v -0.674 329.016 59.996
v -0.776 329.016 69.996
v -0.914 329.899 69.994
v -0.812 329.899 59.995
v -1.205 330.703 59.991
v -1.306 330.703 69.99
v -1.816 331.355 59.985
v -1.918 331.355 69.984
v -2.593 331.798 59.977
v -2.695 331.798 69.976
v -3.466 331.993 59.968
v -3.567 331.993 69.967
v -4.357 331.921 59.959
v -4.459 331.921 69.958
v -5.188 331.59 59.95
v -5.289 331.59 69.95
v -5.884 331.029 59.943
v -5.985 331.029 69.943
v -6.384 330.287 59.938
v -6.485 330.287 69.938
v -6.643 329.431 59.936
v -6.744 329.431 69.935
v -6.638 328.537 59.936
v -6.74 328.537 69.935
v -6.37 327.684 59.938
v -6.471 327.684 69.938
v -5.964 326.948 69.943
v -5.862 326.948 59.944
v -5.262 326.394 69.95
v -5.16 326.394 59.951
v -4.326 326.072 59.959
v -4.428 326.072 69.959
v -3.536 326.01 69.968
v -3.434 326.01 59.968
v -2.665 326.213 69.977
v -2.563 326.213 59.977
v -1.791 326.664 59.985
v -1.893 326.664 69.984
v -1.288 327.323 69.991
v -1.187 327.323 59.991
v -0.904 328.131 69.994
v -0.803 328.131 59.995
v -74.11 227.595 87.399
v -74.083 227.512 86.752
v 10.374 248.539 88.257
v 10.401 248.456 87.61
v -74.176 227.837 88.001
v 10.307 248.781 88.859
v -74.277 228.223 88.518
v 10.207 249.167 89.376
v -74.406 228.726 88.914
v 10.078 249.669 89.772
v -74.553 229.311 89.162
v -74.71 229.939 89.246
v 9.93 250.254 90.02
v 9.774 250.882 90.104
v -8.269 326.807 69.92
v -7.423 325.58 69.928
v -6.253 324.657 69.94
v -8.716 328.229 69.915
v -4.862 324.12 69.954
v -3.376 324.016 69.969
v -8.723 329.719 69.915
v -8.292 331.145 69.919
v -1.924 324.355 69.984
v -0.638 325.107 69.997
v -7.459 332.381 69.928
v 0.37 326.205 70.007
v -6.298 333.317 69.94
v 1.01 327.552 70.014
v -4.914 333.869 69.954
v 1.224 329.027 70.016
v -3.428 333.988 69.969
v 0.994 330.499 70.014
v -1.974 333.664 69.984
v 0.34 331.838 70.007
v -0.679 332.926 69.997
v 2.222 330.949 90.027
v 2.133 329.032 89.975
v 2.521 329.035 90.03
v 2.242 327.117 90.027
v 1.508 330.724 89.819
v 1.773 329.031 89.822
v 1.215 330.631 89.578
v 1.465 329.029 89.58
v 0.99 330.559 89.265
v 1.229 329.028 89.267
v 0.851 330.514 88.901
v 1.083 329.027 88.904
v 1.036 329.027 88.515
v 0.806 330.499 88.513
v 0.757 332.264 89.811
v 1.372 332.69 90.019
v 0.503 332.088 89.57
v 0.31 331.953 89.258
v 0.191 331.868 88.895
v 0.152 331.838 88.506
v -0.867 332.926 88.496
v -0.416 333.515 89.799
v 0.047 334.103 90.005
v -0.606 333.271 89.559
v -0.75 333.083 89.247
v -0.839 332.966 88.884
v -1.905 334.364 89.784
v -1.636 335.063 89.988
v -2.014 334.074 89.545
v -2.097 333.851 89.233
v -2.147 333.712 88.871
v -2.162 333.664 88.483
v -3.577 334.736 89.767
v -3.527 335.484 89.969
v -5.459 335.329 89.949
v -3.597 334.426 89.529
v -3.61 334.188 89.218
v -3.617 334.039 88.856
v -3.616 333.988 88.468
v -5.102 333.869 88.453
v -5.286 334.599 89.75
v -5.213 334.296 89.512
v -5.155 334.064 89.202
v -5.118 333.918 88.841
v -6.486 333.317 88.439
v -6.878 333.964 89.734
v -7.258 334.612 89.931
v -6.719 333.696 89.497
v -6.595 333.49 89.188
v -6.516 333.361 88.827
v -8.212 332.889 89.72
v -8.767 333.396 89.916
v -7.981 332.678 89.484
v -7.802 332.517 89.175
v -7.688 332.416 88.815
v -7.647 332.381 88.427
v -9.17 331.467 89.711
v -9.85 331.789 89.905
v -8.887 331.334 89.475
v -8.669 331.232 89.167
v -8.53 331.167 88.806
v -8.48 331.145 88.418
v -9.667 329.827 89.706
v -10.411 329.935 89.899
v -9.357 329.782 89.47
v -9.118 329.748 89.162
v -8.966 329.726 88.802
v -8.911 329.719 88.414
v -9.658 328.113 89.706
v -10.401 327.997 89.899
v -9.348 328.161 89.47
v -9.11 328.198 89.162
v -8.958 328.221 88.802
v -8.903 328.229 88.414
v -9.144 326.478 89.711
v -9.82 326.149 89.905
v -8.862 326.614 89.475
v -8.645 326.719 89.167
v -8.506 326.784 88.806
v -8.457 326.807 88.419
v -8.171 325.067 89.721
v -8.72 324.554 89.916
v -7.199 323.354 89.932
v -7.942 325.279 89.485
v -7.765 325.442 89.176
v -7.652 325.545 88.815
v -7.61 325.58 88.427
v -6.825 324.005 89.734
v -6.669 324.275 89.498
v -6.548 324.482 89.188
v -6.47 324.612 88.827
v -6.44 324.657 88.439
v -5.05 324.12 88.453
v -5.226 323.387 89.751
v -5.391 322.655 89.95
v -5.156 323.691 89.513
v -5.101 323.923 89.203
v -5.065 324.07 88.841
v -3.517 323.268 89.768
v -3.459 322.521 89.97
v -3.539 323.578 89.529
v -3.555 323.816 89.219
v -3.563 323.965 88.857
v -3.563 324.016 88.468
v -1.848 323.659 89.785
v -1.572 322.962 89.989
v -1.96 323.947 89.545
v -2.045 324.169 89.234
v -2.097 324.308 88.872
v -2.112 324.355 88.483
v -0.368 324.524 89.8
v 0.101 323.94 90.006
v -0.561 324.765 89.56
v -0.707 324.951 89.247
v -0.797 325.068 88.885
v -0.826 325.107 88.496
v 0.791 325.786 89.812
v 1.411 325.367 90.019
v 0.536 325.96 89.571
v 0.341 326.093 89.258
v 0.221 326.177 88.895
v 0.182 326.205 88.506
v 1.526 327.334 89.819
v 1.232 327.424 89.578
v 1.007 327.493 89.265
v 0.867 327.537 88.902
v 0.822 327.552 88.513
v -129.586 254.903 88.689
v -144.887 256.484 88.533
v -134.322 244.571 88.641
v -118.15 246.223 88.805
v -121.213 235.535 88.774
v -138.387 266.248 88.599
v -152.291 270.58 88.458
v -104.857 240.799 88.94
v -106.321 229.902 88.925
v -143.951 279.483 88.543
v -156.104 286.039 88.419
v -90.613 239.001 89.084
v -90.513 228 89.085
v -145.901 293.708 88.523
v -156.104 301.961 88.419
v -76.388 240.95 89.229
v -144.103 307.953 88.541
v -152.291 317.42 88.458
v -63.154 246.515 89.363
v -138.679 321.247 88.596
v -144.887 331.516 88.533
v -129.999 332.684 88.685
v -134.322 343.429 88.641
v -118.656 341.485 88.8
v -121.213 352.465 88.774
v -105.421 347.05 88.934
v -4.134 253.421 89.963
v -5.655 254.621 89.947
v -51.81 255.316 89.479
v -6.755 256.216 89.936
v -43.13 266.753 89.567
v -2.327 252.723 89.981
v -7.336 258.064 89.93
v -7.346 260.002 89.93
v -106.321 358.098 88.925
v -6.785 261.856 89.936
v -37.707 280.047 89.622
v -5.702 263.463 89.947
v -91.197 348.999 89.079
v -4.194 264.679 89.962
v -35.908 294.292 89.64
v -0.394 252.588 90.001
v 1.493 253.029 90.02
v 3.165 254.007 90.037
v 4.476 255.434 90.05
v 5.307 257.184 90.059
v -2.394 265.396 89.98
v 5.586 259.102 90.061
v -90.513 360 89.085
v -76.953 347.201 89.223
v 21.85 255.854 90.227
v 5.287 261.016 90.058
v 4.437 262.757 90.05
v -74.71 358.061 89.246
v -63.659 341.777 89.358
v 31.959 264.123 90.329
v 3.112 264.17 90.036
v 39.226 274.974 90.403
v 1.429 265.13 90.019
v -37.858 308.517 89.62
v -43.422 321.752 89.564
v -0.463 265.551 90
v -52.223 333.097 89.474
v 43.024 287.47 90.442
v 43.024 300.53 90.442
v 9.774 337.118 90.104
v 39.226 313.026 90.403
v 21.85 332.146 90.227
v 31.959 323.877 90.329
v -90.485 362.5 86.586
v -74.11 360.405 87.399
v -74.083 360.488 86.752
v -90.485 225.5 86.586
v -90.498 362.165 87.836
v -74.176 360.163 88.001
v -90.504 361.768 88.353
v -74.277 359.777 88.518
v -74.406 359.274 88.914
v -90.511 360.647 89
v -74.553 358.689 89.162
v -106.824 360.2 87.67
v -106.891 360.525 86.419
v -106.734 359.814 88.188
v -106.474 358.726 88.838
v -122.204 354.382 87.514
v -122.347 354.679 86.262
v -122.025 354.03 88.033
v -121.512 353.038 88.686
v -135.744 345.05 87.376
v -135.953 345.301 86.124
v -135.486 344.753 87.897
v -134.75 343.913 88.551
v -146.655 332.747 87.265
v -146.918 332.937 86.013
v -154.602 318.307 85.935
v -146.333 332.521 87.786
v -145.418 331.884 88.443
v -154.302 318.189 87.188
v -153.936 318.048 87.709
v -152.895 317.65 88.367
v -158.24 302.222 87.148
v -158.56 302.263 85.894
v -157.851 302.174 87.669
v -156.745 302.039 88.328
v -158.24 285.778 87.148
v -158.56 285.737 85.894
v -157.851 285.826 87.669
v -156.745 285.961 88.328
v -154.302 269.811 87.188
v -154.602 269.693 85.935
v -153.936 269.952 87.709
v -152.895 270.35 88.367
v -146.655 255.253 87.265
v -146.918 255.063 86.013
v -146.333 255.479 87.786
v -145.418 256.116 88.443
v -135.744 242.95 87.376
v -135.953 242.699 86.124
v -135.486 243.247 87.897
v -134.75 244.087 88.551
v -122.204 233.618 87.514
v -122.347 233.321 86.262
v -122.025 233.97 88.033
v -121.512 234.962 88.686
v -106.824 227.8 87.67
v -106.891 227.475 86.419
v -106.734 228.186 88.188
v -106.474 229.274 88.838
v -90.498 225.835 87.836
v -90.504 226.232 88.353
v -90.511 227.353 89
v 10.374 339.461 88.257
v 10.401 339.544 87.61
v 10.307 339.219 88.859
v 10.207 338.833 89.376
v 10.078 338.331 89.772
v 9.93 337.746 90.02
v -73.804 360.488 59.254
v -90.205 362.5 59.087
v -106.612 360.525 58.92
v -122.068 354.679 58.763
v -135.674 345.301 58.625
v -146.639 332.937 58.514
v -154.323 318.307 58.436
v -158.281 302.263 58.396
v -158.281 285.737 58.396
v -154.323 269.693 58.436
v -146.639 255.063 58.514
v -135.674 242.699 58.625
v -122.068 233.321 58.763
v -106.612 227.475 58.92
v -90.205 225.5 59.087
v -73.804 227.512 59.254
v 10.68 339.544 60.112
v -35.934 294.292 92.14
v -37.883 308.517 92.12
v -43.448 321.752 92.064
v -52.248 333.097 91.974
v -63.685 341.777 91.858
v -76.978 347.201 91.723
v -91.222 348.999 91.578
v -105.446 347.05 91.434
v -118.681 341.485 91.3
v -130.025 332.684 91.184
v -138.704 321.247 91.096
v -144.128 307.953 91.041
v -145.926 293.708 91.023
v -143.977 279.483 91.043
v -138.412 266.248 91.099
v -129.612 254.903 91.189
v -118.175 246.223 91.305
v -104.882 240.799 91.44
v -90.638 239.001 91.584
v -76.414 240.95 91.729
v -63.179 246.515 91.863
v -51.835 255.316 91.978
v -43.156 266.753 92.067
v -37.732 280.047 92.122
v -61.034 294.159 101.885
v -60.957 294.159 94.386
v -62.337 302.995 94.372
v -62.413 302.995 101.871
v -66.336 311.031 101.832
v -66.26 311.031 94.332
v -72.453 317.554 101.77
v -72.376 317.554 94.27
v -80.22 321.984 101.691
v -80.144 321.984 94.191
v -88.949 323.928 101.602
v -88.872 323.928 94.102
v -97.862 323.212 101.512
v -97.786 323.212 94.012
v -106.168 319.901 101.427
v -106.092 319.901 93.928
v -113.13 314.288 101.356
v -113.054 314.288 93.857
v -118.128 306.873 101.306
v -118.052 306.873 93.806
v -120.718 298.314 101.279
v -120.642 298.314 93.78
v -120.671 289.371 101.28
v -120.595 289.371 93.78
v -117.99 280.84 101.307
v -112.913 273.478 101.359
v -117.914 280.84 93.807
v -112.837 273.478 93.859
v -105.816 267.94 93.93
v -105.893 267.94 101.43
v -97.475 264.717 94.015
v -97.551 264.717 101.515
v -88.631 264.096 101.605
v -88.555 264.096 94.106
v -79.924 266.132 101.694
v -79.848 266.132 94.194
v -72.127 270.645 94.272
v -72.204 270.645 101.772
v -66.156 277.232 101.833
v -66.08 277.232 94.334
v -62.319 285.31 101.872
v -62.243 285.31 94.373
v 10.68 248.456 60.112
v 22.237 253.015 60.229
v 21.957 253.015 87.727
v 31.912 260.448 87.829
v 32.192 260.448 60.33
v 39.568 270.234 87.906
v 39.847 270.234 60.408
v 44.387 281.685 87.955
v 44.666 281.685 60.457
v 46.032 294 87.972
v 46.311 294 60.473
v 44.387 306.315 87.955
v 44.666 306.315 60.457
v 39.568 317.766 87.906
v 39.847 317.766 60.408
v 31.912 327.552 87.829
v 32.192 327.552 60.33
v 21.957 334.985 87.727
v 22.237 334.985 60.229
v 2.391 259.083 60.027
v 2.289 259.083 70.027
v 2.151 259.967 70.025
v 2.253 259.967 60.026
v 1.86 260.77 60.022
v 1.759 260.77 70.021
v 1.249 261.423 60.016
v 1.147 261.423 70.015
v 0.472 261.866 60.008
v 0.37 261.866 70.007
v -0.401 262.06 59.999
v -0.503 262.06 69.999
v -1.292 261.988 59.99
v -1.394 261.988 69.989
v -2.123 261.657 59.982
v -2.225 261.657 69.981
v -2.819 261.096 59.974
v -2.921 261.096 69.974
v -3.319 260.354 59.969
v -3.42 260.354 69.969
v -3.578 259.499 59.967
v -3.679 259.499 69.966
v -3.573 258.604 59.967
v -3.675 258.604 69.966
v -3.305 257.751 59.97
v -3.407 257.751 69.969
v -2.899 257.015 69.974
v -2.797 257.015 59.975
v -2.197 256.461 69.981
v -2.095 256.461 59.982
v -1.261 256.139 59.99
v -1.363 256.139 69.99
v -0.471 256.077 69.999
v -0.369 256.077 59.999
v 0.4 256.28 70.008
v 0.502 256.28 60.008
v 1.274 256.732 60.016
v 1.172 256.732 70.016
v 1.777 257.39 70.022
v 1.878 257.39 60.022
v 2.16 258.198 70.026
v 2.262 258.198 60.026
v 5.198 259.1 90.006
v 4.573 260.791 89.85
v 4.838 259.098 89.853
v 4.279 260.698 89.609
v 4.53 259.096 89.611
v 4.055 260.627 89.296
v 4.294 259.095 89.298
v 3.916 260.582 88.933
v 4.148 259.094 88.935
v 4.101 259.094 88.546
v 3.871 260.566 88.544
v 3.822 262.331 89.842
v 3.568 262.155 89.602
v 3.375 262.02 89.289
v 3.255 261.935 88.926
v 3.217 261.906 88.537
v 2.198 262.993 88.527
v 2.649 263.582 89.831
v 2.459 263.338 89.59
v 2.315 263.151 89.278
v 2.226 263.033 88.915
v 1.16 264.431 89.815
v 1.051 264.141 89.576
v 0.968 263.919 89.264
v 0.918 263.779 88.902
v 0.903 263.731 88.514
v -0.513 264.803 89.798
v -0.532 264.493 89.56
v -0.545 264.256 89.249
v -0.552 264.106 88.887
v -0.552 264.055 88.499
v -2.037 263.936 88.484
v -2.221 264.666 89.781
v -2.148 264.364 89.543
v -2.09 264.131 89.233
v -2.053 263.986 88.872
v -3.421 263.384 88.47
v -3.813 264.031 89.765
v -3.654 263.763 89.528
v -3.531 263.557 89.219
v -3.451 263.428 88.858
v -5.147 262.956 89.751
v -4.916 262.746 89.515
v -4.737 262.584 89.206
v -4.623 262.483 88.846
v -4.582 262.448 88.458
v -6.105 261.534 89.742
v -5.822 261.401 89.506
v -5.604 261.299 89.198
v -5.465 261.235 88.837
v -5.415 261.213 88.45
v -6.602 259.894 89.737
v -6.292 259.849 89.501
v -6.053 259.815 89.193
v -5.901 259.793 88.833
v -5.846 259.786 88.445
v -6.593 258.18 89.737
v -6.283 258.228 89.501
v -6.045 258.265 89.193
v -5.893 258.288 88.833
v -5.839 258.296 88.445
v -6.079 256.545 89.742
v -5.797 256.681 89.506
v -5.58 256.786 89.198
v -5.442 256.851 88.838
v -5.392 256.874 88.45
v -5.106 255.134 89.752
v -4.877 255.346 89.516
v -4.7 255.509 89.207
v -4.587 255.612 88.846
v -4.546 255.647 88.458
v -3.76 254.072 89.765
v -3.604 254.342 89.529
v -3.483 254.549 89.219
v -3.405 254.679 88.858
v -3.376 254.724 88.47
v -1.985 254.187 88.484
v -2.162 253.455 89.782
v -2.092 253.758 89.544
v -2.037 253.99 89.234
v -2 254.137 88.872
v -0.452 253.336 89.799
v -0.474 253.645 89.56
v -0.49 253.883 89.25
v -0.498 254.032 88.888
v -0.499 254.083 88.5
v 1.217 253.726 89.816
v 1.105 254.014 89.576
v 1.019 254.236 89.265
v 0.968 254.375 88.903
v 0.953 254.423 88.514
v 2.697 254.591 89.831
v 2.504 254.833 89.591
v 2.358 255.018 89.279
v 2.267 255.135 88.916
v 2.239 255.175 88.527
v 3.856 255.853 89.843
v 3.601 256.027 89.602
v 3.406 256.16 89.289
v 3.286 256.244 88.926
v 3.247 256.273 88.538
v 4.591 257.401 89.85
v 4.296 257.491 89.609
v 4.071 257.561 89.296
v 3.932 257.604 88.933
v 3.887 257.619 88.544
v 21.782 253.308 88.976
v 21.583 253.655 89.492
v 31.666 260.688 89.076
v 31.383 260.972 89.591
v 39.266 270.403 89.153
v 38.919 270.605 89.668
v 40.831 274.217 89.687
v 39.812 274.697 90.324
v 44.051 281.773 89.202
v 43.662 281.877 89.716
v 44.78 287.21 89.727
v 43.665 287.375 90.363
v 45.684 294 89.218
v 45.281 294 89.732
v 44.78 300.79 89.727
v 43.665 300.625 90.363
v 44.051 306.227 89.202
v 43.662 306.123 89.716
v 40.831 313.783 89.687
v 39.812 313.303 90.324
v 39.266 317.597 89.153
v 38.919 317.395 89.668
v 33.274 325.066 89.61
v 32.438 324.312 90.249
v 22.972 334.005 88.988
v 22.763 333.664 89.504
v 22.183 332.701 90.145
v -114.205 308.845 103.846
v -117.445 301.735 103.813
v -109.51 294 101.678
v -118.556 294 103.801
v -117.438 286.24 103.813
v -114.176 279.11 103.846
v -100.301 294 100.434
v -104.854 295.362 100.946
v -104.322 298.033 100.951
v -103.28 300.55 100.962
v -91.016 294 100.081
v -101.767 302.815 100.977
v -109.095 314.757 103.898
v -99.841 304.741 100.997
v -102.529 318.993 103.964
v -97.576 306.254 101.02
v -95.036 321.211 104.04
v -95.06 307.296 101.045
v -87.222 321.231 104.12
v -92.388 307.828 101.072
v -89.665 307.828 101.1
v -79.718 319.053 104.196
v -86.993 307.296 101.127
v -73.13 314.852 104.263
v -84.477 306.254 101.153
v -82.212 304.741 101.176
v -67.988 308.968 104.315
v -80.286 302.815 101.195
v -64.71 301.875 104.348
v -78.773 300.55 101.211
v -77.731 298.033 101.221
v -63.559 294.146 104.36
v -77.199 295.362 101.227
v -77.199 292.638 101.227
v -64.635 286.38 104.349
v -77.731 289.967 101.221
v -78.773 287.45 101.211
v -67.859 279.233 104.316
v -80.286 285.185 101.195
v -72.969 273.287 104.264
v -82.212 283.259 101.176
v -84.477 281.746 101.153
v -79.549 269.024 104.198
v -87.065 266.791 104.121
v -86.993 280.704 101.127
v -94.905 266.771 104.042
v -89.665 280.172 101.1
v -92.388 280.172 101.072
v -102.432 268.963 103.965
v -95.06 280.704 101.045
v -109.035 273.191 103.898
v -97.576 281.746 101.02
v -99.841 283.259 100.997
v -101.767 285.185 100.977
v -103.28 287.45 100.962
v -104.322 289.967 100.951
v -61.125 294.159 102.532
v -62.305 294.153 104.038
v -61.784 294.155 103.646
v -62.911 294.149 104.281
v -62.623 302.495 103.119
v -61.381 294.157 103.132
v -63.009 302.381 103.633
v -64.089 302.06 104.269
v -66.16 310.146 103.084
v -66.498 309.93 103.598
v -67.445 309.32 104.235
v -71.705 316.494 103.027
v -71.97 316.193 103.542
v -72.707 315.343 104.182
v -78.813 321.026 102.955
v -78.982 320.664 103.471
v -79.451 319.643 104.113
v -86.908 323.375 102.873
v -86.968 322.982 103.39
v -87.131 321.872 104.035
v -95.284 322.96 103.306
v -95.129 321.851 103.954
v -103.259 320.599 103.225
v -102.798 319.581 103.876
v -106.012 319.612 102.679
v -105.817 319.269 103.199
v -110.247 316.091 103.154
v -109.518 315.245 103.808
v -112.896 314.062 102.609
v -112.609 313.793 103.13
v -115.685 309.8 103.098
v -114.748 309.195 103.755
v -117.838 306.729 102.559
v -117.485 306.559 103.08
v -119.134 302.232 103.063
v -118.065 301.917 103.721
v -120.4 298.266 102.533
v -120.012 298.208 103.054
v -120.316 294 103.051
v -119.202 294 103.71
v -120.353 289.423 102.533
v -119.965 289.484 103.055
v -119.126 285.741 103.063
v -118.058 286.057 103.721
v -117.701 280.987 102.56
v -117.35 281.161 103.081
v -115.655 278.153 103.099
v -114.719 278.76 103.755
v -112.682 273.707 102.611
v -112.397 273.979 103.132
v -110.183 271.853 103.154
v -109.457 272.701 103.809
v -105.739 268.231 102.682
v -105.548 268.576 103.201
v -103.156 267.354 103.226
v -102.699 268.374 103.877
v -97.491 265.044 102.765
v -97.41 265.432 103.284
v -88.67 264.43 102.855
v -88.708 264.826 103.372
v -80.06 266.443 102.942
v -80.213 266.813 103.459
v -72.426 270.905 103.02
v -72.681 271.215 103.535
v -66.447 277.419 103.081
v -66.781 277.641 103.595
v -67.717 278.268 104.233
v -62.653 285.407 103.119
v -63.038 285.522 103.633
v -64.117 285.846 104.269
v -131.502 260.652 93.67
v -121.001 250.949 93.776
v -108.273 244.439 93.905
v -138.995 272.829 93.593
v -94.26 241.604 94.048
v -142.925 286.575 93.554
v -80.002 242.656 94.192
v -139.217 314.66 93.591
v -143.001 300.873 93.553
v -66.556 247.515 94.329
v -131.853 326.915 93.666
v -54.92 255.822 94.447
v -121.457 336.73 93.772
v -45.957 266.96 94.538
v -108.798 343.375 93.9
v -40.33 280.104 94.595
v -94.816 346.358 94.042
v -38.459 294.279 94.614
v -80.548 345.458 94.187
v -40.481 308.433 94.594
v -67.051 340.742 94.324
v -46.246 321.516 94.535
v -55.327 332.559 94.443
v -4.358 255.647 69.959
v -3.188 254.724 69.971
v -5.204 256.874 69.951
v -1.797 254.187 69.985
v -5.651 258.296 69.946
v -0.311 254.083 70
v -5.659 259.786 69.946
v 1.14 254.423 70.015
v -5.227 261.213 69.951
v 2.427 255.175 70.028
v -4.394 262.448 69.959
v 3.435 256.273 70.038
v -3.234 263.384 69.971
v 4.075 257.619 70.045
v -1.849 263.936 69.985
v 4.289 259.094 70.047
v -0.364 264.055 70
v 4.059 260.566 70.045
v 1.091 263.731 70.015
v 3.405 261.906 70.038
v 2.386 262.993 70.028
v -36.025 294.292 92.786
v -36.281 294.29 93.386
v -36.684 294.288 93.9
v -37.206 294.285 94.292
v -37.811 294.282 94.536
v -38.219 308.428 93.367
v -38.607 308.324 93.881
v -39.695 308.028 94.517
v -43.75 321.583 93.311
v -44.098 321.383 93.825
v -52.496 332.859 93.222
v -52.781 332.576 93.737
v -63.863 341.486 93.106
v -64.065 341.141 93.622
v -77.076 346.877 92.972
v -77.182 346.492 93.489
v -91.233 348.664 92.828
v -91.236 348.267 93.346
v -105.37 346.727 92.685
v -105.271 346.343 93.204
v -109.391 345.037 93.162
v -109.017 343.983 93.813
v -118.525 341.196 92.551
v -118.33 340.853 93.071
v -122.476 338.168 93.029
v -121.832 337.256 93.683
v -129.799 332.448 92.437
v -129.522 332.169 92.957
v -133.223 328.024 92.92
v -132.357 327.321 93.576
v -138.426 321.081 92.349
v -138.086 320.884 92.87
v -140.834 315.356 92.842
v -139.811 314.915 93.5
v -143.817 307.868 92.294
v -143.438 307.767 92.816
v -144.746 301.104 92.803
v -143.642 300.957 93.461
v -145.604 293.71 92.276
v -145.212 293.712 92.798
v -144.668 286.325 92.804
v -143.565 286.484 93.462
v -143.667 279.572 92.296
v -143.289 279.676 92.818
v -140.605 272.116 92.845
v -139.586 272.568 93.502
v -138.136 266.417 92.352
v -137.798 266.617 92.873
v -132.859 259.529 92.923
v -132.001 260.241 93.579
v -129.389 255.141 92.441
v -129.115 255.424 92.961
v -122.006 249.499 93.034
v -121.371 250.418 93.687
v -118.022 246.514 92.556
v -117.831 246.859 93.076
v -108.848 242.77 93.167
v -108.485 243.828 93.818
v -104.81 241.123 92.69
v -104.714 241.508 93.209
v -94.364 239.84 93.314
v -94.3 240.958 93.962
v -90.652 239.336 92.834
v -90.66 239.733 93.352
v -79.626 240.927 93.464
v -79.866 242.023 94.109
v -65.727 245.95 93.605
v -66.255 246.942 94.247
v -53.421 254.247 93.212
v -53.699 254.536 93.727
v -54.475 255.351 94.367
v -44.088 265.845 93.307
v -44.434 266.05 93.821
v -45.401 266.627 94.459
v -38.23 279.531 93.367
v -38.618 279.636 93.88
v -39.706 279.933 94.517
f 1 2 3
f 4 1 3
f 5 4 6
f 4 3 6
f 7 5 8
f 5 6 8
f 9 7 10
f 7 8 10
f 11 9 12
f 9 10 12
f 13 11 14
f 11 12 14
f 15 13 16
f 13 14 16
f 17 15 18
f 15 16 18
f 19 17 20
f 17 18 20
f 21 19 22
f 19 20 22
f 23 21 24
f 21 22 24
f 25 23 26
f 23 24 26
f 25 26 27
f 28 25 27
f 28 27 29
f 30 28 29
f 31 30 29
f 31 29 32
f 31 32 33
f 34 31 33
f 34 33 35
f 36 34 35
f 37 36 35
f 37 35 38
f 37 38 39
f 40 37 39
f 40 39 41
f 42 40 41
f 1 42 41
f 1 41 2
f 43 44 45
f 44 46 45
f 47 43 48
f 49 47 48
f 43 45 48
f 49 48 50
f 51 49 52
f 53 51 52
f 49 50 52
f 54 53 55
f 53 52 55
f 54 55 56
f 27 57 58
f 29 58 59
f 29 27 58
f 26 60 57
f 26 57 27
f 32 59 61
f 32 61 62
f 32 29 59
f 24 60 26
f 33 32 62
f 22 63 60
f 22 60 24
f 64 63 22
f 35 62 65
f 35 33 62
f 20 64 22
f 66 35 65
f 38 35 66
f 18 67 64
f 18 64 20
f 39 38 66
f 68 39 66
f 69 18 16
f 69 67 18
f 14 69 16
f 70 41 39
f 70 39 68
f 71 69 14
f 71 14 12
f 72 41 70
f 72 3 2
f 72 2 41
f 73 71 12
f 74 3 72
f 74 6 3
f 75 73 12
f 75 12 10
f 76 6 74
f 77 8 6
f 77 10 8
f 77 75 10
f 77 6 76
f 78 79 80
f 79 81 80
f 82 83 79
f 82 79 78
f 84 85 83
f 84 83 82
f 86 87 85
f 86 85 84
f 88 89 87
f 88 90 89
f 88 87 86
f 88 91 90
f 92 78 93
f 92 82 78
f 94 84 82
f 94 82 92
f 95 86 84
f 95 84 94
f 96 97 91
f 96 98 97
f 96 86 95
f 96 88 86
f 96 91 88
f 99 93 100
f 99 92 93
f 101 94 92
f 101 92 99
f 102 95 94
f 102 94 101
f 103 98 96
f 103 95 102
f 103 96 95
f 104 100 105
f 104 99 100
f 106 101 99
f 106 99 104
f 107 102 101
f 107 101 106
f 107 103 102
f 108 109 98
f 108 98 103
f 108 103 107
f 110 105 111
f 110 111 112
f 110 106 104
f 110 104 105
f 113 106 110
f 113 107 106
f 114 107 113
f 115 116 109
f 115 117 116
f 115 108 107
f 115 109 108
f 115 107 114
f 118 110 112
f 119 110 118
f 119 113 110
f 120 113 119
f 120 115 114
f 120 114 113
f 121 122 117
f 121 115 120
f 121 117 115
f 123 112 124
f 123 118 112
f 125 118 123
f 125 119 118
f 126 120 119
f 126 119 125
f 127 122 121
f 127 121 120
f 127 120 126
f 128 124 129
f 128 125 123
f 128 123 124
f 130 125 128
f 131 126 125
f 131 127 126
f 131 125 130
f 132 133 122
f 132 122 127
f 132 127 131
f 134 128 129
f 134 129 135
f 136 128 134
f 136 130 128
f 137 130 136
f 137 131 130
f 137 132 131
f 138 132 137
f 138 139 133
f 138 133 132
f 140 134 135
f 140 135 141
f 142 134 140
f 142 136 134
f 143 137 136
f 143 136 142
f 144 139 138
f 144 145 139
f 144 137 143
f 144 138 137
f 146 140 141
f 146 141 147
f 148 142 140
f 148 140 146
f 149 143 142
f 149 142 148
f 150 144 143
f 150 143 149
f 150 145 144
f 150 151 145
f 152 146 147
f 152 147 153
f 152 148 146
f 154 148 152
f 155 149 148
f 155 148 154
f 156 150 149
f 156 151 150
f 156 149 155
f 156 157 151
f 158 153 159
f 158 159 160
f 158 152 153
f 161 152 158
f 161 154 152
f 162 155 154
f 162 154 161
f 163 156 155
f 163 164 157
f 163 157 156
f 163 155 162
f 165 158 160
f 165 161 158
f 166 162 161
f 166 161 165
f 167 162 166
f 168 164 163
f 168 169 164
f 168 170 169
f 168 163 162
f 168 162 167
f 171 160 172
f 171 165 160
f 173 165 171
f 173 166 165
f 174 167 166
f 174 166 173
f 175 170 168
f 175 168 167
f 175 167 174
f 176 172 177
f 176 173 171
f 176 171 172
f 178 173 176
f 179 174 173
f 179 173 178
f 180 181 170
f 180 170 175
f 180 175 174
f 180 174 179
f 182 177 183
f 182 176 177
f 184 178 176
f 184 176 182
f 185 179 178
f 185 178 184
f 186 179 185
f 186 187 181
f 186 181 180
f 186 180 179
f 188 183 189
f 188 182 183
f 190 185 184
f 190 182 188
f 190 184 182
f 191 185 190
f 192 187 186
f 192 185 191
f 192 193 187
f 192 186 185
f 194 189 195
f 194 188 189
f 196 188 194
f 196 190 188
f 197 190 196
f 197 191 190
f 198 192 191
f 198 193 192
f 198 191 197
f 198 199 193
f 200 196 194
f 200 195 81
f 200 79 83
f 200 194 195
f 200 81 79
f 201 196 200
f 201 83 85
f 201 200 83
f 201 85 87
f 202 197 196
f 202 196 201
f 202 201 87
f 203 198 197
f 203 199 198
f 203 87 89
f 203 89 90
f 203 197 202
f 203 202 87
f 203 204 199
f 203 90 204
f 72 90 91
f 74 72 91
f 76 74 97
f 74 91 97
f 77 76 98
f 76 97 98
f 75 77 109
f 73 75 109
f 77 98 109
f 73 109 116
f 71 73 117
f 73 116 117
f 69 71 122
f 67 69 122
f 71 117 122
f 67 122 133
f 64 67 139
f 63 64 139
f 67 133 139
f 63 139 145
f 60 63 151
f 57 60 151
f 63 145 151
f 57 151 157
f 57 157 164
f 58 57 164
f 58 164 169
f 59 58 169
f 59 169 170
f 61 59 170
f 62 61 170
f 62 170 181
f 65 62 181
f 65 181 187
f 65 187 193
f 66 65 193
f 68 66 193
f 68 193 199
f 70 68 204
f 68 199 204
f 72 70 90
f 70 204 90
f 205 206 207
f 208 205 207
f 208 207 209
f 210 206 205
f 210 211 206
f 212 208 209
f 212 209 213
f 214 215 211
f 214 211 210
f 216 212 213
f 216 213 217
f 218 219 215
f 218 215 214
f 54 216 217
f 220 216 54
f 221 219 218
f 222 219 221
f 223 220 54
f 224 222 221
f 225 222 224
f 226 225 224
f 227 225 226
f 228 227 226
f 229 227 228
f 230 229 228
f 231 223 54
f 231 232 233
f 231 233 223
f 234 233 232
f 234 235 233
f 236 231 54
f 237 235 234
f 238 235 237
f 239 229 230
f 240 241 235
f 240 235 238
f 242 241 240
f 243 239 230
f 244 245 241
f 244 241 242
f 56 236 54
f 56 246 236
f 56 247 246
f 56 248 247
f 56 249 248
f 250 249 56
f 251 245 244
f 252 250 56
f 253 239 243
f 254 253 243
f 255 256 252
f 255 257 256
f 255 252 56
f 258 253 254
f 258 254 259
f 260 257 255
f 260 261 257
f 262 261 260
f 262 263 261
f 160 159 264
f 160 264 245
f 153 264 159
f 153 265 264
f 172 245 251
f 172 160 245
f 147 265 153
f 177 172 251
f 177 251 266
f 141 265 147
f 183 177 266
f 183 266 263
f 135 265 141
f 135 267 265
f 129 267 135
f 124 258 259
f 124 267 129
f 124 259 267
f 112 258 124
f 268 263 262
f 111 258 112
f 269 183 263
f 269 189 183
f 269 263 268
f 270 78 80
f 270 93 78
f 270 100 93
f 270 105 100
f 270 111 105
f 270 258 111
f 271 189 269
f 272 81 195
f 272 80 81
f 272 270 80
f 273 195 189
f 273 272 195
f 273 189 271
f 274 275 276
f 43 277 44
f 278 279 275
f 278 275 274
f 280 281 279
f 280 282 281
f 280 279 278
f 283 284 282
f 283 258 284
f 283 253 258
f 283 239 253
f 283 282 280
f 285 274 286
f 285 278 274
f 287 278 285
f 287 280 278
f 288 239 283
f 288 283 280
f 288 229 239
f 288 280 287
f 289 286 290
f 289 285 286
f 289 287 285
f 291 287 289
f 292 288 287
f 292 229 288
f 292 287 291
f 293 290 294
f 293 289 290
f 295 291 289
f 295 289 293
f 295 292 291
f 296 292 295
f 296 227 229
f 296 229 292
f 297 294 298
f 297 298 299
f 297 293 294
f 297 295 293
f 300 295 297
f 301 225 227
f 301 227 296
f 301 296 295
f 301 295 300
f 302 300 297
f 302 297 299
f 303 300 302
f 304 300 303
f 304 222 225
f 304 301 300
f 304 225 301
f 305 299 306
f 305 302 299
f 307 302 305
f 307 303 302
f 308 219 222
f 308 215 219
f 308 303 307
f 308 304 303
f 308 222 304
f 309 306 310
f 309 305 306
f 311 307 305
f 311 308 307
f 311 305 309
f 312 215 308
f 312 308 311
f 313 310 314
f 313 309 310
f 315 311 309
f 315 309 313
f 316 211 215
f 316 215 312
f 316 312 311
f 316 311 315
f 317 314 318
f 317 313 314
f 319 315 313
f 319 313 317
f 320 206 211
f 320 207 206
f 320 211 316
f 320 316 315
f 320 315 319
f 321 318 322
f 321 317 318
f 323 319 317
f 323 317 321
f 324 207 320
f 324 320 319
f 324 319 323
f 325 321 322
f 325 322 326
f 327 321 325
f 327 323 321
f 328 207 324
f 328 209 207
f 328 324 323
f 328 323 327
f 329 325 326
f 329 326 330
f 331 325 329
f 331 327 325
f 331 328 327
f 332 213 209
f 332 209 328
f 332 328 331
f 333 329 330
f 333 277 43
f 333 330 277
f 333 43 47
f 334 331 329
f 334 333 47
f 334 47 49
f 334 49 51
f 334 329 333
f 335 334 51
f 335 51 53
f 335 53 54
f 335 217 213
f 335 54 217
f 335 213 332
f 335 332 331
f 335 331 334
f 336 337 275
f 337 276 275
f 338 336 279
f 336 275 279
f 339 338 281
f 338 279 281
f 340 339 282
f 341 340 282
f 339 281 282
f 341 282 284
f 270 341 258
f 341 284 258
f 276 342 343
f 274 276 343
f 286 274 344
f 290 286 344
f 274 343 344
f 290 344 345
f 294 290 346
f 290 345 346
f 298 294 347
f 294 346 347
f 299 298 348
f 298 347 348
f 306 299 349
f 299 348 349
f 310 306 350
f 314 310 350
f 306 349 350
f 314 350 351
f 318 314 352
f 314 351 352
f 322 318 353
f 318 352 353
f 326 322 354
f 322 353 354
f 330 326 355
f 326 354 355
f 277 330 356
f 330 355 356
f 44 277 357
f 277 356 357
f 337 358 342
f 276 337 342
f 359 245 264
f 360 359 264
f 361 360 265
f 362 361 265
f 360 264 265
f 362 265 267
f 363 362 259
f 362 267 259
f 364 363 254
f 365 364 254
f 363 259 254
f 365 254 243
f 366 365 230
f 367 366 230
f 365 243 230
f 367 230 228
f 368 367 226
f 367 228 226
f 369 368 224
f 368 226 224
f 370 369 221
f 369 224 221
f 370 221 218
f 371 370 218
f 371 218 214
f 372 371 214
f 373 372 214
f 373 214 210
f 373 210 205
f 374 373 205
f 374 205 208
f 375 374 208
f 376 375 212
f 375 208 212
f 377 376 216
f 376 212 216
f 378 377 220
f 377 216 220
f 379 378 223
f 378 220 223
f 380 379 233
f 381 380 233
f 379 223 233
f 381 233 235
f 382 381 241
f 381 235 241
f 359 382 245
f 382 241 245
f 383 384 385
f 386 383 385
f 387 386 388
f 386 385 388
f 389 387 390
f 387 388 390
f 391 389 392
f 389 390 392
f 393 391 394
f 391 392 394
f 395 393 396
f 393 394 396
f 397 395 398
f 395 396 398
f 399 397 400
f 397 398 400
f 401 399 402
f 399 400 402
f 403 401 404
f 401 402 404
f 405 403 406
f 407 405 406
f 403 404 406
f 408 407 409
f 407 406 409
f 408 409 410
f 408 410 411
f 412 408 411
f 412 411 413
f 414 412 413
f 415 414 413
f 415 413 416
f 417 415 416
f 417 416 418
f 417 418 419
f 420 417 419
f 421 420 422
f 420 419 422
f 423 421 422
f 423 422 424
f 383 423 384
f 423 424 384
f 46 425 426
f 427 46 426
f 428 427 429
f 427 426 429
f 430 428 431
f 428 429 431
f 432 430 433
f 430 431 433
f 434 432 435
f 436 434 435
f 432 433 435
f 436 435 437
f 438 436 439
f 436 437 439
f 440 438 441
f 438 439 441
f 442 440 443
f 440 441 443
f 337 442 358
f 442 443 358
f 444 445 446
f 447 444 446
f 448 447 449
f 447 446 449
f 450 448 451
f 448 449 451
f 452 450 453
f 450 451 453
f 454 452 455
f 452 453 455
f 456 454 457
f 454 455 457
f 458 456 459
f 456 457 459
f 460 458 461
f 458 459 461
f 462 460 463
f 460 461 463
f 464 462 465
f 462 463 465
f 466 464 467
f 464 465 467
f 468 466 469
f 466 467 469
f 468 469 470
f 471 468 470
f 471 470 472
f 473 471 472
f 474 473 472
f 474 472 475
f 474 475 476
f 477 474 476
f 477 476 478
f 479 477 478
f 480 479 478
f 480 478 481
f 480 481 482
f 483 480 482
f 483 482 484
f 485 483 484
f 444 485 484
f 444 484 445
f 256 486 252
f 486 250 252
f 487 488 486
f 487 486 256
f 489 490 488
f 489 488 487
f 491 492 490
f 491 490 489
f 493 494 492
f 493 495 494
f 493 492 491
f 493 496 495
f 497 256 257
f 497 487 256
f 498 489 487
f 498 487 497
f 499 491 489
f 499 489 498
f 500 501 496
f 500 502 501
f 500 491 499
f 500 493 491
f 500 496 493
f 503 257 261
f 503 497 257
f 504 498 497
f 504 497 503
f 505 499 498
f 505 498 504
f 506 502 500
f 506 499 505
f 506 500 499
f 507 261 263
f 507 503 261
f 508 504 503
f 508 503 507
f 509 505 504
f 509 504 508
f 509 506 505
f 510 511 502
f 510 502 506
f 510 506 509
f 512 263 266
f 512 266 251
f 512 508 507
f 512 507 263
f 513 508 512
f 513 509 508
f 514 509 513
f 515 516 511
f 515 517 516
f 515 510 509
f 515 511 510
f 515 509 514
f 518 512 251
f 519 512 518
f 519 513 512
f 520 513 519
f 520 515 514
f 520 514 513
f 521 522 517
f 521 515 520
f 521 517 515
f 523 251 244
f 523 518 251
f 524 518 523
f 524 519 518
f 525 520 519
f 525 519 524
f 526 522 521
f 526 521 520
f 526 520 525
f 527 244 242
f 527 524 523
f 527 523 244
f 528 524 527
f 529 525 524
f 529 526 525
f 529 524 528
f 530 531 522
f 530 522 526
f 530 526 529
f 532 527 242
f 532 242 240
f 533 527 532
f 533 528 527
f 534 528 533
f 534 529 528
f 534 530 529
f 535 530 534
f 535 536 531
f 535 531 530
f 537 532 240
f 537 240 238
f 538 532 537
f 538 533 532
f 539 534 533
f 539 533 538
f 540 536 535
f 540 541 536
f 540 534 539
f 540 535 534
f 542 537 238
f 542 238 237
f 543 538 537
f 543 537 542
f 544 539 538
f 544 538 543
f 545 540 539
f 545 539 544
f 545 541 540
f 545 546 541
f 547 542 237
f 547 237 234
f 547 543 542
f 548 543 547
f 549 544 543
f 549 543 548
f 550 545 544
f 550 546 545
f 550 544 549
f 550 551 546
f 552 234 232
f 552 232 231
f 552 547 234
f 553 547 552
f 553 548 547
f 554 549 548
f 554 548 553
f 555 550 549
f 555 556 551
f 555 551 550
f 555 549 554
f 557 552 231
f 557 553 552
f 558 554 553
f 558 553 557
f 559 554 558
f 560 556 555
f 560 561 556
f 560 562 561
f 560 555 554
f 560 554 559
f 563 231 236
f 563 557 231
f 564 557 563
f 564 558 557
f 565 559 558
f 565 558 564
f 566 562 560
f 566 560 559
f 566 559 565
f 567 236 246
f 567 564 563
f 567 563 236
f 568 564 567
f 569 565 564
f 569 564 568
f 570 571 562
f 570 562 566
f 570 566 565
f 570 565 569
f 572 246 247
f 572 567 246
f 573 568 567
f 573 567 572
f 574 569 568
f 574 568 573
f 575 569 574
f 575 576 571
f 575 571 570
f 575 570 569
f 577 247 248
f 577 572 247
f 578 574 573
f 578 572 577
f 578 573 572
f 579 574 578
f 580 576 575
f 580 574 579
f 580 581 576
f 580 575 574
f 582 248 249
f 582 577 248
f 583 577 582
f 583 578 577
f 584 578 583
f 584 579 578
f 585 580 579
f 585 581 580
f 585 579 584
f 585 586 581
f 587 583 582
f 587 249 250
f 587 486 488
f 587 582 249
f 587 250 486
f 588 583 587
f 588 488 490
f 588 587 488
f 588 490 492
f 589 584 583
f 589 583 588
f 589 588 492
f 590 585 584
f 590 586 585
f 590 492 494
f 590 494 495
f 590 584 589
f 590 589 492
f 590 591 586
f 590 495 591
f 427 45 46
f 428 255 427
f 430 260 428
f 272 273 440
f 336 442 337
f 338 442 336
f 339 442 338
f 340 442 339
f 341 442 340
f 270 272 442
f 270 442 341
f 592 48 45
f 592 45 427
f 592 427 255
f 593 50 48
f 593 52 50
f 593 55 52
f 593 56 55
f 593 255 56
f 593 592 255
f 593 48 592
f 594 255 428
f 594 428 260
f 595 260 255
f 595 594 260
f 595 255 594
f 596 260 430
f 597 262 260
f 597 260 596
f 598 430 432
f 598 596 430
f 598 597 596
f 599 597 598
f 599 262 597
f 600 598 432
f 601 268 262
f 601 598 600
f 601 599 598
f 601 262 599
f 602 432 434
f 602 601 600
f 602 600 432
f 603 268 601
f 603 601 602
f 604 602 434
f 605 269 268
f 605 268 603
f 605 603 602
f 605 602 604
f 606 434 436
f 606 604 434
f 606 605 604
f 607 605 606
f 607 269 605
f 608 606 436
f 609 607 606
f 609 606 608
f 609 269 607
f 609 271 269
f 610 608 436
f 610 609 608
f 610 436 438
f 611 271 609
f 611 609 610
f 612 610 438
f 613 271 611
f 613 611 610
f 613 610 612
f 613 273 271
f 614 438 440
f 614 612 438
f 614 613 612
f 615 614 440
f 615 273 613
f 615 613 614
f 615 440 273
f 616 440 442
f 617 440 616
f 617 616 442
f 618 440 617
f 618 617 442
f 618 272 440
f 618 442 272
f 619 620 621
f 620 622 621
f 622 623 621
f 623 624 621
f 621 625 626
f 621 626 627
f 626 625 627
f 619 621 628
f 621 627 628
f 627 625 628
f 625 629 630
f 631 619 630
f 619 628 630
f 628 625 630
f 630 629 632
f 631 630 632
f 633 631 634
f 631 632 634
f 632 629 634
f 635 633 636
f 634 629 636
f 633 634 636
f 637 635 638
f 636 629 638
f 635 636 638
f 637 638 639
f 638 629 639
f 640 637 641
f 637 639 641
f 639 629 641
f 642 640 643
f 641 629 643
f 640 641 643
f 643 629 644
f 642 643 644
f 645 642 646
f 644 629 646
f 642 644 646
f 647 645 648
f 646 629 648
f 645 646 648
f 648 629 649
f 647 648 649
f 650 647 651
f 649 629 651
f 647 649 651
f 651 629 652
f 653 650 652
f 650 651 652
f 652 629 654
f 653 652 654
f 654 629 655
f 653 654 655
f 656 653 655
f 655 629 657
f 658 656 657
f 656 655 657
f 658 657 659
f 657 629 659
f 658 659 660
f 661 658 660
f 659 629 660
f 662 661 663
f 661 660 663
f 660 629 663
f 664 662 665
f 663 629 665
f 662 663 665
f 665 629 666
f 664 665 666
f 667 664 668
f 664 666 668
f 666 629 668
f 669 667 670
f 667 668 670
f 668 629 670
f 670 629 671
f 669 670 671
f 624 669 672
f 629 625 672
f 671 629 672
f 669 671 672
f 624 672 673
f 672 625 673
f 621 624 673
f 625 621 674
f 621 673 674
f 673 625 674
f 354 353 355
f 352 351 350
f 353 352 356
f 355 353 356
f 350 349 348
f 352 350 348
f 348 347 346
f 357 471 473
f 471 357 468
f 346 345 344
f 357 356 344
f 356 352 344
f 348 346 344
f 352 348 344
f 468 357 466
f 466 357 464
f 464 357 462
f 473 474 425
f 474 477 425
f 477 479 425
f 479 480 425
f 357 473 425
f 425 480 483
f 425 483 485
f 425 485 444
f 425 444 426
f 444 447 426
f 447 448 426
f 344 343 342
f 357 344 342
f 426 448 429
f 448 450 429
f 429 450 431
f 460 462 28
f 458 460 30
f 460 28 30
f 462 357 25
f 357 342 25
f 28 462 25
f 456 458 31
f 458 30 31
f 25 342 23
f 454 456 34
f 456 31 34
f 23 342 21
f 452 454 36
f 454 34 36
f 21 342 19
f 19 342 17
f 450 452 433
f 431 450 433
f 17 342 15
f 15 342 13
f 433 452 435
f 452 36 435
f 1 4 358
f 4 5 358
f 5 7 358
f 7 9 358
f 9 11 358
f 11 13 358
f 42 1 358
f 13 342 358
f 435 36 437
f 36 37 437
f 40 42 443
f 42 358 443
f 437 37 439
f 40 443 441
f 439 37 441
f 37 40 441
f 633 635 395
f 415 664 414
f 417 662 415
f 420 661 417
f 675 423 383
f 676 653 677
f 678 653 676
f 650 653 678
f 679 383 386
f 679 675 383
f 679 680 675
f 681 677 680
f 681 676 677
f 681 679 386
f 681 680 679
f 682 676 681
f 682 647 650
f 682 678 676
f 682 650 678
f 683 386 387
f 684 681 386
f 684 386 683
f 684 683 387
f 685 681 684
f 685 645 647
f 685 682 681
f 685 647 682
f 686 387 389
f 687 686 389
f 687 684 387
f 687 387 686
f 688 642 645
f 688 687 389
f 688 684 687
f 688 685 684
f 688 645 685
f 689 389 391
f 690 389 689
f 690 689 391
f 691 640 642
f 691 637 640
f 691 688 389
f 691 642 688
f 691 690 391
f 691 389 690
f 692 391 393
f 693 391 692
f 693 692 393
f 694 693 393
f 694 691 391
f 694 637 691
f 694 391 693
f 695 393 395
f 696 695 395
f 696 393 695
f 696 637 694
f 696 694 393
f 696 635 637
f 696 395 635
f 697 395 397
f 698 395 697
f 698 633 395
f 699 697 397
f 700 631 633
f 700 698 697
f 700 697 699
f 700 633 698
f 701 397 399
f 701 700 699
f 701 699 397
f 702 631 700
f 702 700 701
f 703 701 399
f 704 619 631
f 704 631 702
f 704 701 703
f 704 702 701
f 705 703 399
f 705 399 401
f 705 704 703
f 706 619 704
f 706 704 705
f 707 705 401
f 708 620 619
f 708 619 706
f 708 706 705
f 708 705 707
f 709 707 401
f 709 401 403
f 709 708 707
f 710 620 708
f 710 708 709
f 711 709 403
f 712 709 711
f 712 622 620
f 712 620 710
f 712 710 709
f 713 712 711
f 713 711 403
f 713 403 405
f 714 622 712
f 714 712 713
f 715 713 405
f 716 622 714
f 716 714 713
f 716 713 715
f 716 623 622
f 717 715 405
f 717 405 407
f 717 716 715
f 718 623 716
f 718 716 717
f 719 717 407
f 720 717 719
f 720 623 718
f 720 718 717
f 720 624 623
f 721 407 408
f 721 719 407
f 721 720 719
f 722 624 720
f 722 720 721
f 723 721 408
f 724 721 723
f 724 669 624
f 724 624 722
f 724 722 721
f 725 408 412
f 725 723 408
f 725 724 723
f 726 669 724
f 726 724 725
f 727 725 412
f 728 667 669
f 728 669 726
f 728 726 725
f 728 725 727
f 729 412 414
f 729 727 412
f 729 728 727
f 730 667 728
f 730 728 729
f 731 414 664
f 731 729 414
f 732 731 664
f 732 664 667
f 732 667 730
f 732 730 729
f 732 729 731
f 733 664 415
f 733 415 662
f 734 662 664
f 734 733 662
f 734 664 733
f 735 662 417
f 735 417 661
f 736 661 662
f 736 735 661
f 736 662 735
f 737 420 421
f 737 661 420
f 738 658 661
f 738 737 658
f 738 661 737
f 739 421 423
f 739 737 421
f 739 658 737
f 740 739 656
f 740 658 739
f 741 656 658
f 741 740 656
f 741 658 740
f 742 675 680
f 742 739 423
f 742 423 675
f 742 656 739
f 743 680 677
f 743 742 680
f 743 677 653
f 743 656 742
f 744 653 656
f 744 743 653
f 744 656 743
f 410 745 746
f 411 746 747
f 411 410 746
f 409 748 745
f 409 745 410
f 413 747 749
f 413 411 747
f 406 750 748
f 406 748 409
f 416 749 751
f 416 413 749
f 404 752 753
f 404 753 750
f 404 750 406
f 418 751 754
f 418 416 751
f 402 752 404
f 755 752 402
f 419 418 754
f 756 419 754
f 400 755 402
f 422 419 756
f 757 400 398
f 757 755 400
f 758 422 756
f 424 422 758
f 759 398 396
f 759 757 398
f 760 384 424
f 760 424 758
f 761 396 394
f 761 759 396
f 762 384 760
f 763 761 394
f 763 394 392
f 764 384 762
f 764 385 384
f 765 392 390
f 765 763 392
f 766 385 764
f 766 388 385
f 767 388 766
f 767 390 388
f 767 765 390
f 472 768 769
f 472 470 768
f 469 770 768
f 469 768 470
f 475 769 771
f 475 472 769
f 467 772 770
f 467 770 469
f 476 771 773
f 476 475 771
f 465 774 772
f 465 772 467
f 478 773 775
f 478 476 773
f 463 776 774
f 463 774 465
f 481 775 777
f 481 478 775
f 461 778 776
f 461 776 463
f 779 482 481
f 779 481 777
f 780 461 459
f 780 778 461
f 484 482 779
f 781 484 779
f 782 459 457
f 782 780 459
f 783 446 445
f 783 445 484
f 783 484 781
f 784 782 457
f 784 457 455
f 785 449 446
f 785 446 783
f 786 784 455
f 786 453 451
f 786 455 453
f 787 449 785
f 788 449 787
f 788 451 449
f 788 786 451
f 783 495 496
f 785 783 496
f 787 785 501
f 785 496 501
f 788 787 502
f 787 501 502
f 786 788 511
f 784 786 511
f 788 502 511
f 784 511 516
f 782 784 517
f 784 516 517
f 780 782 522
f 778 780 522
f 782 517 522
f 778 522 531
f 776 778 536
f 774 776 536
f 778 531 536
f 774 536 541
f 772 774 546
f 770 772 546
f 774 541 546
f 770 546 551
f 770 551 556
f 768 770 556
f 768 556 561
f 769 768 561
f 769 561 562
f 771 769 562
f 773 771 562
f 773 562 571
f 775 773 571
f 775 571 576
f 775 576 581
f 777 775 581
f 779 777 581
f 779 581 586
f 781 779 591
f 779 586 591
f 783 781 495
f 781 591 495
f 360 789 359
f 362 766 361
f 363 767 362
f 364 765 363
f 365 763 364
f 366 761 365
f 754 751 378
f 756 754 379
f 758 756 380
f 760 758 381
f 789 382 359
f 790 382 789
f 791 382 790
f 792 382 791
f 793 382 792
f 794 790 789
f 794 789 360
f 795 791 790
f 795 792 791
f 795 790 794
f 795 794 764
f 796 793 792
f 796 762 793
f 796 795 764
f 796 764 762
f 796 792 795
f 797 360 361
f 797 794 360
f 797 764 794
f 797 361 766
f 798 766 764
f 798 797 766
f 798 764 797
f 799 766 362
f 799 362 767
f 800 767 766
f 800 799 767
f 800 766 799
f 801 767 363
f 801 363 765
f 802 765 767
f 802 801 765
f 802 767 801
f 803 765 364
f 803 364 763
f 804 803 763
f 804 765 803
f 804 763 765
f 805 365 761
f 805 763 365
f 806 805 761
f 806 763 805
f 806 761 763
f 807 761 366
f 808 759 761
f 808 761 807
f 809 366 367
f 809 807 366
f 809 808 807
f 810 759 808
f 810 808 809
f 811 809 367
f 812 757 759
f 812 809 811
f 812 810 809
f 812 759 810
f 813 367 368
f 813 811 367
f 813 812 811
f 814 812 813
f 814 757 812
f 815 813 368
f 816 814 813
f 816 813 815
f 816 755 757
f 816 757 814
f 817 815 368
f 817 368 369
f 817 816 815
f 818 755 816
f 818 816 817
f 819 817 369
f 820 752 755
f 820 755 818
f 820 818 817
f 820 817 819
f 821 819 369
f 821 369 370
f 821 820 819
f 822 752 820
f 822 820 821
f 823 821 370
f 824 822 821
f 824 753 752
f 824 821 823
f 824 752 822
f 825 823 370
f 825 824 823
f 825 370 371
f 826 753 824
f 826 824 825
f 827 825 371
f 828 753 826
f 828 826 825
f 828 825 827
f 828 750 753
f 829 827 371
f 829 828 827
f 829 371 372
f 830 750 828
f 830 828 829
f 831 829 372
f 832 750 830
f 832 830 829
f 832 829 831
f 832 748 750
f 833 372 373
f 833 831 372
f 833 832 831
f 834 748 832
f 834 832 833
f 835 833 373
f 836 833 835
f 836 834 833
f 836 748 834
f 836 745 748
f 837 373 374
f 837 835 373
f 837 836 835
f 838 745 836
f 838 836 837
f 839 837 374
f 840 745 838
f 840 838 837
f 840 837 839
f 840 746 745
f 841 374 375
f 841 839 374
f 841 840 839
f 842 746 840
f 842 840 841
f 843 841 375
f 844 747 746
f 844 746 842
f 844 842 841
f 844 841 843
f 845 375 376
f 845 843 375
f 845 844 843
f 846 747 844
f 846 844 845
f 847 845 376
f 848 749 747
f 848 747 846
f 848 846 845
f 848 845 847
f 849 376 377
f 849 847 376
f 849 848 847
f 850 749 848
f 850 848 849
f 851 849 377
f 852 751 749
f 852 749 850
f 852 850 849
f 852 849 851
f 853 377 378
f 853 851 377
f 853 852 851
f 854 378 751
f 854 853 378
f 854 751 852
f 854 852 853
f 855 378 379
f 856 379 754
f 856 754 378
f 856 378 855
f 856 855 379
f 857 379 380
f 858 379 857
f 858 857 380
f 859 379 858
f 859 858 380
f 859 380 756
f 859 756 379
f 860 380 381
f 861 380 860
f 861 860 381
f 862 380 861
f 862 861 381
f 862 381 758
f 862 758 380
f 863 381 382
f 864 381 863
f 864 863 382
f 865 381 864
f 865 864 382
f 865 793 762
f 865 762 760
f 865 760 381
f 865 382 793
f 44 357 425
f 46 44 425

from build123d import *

# Parameters (mm, degrees)
BOSS_EXTRUDE1_DEPTH = 30
SKETCH2_R           = 55
BOSS_EXTRUDE2_DEPTH = 5
SKETCH3_R           = 30
BOSS_EXTRUDE3_DEPTH = 10
SKETCH4_R           = 5
CUT_EXTRUDE4_DEPTH  = 20
SKETCH5_R           = 3
CUT_EXTRUDE5_DEPTH  = 33.082590237
FILLET1_R           = 2.5
FILLET2_R           = 1.5
DOME1_FACE_RADIUS   = 27.5
DOME1_HEIGHT        = 4


with BuildPart() as part:
    # Sketch1 → Boss-Extrude1 (new body)
    with BuildSketch(Plane(origin=(-0.609266147, 0, 59.996906543), x_dir=(0.99993435, 0.005309042, 0.010154293), z_dir=(-0.010154436, 0, 0.999948442))):
        with BuildLine():
            Line((13.092334874, 339.479342253), (-71.283345055, 360.871198017))
            ThreePointArc((-71.283345055, 360.871198017), (-156.616646458, 294.835639545), (-71.989316722, 227.897740169))
            Line((-71.989316722, 227.897740169), (12.608744127, 248.392494546))
            ThreePointArc((12.608744127, 248.392494546), (48.482712148, 293.74674302), (13.092334874, 339.479342253))
        make_face()
    extrude(amount=BOSS_EXTRUDE1_DEPTH)

    # Sketch2 → Boss-Extrude2 (add)
    with BuildSketch(Plane(origin=(-0.91389922, 0, 89.995359815), x_dir=(0.99993435, 0.005309042, 0.010154293), z_dir=(-0.010154436, 0, 0.999948442))):
        with Locations((-88.433233056, 294.473645815)):
            Circle(SKETCH2_R)
    extrude(amount=BOSS_EXTRUDE2_DEPTH)

    # Sketch3 → Boss-Extrude3 (add)
    with BuildSketch(Plane(origin=(-0.964671399, 0, 94.995102027), x_dir=(0.99993435, 0.005309042, 0.010154293), z_dir=(-0.010154436, 0, 0.999948442))):
        with Locations((-88.433233056, 294.473645815)):
            Circle(SKETCH3_R)
    extrude(amount=BOSS_EXTRUDE3_DEPTH)

    # Sketch4 → Cut-Extrude4 (cut)
    with BuildSketch(Plane(origin=(-0.91389922, 0, 89.995359815), x_dir=(0.99993435, 0.005309042, 0.010154293), z_dir=(-0.010154436, 0, 0.999948442))):
        with Locations((-1.318283572, 329.011635606)):
            Circle(SKETCH4_R)
        with Locations((1.375398384, 259.063482824)):
            Circle(SKETCH4_R)
    extrude(amount=-CUT_EXTRUDE4_DEPTH, mode=Mode.SUBTRACT)

    # Sketch5 → Cut-Extrude5 (cut, through all)
    with BuildSketch(Plane(origin=(-0.91389922, 0, 89.995359815), x_dir=(0.99993435, 0.005309042, 0.010154293), z_dir=(-0.010154436, 0, 0.999948442))):
        with Locations((-1.318283572, 329.011635606)):
            Circle(SKETCH5_R)
        with Locations((1.375398384, 259.063482824)):
            Circle(SKETCH5_R)
    extrude(amount=-CUT_EXTRUDE5_DEPTH, mode=Mode.SUBTRACT)

    # Fillet1
    fillet1_edges = [part.edges().sort_by_distance(p)[0] for p in [
        (-159.085477995, 294, 88.389133863),
        (-145.951780521, 293.708002671, 93.522763829),
        (-31.866493678, 237.984134176, 89.681037477),
        (-121.054966127, 293.84072873, 103.776105569),
        (46.006196549, 294, 90.47183148),
        (-31.866493678, 350.015865824, 89.681037477),
    ]]
    fillet(fillet1_edges, radius=FILLET1_R)

    # Fillet2
    fillet2_edges = [part.edges().sort_by_distance(p)[0] for p in [
        (-8.978414644, 328.973454788, 89.913464989),
        (-5.91357097, 259.040588662, 89.944588352),
    ]]
    fillet(fillet2_edges, radius=FILLET2_R)

    # Dome1: a dome of height H over a round flat face of radius A is a cap of a sphere of radius (A * A + H * H) / (2 * H)
    dome1_r = (DOME1_FACE_RADIUS * DOME1_FACE_RADIUS + DOME1_HEIGHT * DOME1_HEIGHT) / (2 * DOME1_HEIGHT)
    dome1_base = Plane((-91.056935626, 294, 104.080734349), z_dir=(0.010154436, 0, -0.999948442))
    with Locations(dome1_base.offset(DOME1_HEIGHT - dome1_r)):
        dome1_ball = Sphere(dome1_r, mode=Mode.PRIVATE)
    add(split(dome1_ball, bisect_by=dome1_base, keep=Keep.TOP, mode=Mode.PRIVATE), mode=Mode.SUBTRACT)


solid = part.part
